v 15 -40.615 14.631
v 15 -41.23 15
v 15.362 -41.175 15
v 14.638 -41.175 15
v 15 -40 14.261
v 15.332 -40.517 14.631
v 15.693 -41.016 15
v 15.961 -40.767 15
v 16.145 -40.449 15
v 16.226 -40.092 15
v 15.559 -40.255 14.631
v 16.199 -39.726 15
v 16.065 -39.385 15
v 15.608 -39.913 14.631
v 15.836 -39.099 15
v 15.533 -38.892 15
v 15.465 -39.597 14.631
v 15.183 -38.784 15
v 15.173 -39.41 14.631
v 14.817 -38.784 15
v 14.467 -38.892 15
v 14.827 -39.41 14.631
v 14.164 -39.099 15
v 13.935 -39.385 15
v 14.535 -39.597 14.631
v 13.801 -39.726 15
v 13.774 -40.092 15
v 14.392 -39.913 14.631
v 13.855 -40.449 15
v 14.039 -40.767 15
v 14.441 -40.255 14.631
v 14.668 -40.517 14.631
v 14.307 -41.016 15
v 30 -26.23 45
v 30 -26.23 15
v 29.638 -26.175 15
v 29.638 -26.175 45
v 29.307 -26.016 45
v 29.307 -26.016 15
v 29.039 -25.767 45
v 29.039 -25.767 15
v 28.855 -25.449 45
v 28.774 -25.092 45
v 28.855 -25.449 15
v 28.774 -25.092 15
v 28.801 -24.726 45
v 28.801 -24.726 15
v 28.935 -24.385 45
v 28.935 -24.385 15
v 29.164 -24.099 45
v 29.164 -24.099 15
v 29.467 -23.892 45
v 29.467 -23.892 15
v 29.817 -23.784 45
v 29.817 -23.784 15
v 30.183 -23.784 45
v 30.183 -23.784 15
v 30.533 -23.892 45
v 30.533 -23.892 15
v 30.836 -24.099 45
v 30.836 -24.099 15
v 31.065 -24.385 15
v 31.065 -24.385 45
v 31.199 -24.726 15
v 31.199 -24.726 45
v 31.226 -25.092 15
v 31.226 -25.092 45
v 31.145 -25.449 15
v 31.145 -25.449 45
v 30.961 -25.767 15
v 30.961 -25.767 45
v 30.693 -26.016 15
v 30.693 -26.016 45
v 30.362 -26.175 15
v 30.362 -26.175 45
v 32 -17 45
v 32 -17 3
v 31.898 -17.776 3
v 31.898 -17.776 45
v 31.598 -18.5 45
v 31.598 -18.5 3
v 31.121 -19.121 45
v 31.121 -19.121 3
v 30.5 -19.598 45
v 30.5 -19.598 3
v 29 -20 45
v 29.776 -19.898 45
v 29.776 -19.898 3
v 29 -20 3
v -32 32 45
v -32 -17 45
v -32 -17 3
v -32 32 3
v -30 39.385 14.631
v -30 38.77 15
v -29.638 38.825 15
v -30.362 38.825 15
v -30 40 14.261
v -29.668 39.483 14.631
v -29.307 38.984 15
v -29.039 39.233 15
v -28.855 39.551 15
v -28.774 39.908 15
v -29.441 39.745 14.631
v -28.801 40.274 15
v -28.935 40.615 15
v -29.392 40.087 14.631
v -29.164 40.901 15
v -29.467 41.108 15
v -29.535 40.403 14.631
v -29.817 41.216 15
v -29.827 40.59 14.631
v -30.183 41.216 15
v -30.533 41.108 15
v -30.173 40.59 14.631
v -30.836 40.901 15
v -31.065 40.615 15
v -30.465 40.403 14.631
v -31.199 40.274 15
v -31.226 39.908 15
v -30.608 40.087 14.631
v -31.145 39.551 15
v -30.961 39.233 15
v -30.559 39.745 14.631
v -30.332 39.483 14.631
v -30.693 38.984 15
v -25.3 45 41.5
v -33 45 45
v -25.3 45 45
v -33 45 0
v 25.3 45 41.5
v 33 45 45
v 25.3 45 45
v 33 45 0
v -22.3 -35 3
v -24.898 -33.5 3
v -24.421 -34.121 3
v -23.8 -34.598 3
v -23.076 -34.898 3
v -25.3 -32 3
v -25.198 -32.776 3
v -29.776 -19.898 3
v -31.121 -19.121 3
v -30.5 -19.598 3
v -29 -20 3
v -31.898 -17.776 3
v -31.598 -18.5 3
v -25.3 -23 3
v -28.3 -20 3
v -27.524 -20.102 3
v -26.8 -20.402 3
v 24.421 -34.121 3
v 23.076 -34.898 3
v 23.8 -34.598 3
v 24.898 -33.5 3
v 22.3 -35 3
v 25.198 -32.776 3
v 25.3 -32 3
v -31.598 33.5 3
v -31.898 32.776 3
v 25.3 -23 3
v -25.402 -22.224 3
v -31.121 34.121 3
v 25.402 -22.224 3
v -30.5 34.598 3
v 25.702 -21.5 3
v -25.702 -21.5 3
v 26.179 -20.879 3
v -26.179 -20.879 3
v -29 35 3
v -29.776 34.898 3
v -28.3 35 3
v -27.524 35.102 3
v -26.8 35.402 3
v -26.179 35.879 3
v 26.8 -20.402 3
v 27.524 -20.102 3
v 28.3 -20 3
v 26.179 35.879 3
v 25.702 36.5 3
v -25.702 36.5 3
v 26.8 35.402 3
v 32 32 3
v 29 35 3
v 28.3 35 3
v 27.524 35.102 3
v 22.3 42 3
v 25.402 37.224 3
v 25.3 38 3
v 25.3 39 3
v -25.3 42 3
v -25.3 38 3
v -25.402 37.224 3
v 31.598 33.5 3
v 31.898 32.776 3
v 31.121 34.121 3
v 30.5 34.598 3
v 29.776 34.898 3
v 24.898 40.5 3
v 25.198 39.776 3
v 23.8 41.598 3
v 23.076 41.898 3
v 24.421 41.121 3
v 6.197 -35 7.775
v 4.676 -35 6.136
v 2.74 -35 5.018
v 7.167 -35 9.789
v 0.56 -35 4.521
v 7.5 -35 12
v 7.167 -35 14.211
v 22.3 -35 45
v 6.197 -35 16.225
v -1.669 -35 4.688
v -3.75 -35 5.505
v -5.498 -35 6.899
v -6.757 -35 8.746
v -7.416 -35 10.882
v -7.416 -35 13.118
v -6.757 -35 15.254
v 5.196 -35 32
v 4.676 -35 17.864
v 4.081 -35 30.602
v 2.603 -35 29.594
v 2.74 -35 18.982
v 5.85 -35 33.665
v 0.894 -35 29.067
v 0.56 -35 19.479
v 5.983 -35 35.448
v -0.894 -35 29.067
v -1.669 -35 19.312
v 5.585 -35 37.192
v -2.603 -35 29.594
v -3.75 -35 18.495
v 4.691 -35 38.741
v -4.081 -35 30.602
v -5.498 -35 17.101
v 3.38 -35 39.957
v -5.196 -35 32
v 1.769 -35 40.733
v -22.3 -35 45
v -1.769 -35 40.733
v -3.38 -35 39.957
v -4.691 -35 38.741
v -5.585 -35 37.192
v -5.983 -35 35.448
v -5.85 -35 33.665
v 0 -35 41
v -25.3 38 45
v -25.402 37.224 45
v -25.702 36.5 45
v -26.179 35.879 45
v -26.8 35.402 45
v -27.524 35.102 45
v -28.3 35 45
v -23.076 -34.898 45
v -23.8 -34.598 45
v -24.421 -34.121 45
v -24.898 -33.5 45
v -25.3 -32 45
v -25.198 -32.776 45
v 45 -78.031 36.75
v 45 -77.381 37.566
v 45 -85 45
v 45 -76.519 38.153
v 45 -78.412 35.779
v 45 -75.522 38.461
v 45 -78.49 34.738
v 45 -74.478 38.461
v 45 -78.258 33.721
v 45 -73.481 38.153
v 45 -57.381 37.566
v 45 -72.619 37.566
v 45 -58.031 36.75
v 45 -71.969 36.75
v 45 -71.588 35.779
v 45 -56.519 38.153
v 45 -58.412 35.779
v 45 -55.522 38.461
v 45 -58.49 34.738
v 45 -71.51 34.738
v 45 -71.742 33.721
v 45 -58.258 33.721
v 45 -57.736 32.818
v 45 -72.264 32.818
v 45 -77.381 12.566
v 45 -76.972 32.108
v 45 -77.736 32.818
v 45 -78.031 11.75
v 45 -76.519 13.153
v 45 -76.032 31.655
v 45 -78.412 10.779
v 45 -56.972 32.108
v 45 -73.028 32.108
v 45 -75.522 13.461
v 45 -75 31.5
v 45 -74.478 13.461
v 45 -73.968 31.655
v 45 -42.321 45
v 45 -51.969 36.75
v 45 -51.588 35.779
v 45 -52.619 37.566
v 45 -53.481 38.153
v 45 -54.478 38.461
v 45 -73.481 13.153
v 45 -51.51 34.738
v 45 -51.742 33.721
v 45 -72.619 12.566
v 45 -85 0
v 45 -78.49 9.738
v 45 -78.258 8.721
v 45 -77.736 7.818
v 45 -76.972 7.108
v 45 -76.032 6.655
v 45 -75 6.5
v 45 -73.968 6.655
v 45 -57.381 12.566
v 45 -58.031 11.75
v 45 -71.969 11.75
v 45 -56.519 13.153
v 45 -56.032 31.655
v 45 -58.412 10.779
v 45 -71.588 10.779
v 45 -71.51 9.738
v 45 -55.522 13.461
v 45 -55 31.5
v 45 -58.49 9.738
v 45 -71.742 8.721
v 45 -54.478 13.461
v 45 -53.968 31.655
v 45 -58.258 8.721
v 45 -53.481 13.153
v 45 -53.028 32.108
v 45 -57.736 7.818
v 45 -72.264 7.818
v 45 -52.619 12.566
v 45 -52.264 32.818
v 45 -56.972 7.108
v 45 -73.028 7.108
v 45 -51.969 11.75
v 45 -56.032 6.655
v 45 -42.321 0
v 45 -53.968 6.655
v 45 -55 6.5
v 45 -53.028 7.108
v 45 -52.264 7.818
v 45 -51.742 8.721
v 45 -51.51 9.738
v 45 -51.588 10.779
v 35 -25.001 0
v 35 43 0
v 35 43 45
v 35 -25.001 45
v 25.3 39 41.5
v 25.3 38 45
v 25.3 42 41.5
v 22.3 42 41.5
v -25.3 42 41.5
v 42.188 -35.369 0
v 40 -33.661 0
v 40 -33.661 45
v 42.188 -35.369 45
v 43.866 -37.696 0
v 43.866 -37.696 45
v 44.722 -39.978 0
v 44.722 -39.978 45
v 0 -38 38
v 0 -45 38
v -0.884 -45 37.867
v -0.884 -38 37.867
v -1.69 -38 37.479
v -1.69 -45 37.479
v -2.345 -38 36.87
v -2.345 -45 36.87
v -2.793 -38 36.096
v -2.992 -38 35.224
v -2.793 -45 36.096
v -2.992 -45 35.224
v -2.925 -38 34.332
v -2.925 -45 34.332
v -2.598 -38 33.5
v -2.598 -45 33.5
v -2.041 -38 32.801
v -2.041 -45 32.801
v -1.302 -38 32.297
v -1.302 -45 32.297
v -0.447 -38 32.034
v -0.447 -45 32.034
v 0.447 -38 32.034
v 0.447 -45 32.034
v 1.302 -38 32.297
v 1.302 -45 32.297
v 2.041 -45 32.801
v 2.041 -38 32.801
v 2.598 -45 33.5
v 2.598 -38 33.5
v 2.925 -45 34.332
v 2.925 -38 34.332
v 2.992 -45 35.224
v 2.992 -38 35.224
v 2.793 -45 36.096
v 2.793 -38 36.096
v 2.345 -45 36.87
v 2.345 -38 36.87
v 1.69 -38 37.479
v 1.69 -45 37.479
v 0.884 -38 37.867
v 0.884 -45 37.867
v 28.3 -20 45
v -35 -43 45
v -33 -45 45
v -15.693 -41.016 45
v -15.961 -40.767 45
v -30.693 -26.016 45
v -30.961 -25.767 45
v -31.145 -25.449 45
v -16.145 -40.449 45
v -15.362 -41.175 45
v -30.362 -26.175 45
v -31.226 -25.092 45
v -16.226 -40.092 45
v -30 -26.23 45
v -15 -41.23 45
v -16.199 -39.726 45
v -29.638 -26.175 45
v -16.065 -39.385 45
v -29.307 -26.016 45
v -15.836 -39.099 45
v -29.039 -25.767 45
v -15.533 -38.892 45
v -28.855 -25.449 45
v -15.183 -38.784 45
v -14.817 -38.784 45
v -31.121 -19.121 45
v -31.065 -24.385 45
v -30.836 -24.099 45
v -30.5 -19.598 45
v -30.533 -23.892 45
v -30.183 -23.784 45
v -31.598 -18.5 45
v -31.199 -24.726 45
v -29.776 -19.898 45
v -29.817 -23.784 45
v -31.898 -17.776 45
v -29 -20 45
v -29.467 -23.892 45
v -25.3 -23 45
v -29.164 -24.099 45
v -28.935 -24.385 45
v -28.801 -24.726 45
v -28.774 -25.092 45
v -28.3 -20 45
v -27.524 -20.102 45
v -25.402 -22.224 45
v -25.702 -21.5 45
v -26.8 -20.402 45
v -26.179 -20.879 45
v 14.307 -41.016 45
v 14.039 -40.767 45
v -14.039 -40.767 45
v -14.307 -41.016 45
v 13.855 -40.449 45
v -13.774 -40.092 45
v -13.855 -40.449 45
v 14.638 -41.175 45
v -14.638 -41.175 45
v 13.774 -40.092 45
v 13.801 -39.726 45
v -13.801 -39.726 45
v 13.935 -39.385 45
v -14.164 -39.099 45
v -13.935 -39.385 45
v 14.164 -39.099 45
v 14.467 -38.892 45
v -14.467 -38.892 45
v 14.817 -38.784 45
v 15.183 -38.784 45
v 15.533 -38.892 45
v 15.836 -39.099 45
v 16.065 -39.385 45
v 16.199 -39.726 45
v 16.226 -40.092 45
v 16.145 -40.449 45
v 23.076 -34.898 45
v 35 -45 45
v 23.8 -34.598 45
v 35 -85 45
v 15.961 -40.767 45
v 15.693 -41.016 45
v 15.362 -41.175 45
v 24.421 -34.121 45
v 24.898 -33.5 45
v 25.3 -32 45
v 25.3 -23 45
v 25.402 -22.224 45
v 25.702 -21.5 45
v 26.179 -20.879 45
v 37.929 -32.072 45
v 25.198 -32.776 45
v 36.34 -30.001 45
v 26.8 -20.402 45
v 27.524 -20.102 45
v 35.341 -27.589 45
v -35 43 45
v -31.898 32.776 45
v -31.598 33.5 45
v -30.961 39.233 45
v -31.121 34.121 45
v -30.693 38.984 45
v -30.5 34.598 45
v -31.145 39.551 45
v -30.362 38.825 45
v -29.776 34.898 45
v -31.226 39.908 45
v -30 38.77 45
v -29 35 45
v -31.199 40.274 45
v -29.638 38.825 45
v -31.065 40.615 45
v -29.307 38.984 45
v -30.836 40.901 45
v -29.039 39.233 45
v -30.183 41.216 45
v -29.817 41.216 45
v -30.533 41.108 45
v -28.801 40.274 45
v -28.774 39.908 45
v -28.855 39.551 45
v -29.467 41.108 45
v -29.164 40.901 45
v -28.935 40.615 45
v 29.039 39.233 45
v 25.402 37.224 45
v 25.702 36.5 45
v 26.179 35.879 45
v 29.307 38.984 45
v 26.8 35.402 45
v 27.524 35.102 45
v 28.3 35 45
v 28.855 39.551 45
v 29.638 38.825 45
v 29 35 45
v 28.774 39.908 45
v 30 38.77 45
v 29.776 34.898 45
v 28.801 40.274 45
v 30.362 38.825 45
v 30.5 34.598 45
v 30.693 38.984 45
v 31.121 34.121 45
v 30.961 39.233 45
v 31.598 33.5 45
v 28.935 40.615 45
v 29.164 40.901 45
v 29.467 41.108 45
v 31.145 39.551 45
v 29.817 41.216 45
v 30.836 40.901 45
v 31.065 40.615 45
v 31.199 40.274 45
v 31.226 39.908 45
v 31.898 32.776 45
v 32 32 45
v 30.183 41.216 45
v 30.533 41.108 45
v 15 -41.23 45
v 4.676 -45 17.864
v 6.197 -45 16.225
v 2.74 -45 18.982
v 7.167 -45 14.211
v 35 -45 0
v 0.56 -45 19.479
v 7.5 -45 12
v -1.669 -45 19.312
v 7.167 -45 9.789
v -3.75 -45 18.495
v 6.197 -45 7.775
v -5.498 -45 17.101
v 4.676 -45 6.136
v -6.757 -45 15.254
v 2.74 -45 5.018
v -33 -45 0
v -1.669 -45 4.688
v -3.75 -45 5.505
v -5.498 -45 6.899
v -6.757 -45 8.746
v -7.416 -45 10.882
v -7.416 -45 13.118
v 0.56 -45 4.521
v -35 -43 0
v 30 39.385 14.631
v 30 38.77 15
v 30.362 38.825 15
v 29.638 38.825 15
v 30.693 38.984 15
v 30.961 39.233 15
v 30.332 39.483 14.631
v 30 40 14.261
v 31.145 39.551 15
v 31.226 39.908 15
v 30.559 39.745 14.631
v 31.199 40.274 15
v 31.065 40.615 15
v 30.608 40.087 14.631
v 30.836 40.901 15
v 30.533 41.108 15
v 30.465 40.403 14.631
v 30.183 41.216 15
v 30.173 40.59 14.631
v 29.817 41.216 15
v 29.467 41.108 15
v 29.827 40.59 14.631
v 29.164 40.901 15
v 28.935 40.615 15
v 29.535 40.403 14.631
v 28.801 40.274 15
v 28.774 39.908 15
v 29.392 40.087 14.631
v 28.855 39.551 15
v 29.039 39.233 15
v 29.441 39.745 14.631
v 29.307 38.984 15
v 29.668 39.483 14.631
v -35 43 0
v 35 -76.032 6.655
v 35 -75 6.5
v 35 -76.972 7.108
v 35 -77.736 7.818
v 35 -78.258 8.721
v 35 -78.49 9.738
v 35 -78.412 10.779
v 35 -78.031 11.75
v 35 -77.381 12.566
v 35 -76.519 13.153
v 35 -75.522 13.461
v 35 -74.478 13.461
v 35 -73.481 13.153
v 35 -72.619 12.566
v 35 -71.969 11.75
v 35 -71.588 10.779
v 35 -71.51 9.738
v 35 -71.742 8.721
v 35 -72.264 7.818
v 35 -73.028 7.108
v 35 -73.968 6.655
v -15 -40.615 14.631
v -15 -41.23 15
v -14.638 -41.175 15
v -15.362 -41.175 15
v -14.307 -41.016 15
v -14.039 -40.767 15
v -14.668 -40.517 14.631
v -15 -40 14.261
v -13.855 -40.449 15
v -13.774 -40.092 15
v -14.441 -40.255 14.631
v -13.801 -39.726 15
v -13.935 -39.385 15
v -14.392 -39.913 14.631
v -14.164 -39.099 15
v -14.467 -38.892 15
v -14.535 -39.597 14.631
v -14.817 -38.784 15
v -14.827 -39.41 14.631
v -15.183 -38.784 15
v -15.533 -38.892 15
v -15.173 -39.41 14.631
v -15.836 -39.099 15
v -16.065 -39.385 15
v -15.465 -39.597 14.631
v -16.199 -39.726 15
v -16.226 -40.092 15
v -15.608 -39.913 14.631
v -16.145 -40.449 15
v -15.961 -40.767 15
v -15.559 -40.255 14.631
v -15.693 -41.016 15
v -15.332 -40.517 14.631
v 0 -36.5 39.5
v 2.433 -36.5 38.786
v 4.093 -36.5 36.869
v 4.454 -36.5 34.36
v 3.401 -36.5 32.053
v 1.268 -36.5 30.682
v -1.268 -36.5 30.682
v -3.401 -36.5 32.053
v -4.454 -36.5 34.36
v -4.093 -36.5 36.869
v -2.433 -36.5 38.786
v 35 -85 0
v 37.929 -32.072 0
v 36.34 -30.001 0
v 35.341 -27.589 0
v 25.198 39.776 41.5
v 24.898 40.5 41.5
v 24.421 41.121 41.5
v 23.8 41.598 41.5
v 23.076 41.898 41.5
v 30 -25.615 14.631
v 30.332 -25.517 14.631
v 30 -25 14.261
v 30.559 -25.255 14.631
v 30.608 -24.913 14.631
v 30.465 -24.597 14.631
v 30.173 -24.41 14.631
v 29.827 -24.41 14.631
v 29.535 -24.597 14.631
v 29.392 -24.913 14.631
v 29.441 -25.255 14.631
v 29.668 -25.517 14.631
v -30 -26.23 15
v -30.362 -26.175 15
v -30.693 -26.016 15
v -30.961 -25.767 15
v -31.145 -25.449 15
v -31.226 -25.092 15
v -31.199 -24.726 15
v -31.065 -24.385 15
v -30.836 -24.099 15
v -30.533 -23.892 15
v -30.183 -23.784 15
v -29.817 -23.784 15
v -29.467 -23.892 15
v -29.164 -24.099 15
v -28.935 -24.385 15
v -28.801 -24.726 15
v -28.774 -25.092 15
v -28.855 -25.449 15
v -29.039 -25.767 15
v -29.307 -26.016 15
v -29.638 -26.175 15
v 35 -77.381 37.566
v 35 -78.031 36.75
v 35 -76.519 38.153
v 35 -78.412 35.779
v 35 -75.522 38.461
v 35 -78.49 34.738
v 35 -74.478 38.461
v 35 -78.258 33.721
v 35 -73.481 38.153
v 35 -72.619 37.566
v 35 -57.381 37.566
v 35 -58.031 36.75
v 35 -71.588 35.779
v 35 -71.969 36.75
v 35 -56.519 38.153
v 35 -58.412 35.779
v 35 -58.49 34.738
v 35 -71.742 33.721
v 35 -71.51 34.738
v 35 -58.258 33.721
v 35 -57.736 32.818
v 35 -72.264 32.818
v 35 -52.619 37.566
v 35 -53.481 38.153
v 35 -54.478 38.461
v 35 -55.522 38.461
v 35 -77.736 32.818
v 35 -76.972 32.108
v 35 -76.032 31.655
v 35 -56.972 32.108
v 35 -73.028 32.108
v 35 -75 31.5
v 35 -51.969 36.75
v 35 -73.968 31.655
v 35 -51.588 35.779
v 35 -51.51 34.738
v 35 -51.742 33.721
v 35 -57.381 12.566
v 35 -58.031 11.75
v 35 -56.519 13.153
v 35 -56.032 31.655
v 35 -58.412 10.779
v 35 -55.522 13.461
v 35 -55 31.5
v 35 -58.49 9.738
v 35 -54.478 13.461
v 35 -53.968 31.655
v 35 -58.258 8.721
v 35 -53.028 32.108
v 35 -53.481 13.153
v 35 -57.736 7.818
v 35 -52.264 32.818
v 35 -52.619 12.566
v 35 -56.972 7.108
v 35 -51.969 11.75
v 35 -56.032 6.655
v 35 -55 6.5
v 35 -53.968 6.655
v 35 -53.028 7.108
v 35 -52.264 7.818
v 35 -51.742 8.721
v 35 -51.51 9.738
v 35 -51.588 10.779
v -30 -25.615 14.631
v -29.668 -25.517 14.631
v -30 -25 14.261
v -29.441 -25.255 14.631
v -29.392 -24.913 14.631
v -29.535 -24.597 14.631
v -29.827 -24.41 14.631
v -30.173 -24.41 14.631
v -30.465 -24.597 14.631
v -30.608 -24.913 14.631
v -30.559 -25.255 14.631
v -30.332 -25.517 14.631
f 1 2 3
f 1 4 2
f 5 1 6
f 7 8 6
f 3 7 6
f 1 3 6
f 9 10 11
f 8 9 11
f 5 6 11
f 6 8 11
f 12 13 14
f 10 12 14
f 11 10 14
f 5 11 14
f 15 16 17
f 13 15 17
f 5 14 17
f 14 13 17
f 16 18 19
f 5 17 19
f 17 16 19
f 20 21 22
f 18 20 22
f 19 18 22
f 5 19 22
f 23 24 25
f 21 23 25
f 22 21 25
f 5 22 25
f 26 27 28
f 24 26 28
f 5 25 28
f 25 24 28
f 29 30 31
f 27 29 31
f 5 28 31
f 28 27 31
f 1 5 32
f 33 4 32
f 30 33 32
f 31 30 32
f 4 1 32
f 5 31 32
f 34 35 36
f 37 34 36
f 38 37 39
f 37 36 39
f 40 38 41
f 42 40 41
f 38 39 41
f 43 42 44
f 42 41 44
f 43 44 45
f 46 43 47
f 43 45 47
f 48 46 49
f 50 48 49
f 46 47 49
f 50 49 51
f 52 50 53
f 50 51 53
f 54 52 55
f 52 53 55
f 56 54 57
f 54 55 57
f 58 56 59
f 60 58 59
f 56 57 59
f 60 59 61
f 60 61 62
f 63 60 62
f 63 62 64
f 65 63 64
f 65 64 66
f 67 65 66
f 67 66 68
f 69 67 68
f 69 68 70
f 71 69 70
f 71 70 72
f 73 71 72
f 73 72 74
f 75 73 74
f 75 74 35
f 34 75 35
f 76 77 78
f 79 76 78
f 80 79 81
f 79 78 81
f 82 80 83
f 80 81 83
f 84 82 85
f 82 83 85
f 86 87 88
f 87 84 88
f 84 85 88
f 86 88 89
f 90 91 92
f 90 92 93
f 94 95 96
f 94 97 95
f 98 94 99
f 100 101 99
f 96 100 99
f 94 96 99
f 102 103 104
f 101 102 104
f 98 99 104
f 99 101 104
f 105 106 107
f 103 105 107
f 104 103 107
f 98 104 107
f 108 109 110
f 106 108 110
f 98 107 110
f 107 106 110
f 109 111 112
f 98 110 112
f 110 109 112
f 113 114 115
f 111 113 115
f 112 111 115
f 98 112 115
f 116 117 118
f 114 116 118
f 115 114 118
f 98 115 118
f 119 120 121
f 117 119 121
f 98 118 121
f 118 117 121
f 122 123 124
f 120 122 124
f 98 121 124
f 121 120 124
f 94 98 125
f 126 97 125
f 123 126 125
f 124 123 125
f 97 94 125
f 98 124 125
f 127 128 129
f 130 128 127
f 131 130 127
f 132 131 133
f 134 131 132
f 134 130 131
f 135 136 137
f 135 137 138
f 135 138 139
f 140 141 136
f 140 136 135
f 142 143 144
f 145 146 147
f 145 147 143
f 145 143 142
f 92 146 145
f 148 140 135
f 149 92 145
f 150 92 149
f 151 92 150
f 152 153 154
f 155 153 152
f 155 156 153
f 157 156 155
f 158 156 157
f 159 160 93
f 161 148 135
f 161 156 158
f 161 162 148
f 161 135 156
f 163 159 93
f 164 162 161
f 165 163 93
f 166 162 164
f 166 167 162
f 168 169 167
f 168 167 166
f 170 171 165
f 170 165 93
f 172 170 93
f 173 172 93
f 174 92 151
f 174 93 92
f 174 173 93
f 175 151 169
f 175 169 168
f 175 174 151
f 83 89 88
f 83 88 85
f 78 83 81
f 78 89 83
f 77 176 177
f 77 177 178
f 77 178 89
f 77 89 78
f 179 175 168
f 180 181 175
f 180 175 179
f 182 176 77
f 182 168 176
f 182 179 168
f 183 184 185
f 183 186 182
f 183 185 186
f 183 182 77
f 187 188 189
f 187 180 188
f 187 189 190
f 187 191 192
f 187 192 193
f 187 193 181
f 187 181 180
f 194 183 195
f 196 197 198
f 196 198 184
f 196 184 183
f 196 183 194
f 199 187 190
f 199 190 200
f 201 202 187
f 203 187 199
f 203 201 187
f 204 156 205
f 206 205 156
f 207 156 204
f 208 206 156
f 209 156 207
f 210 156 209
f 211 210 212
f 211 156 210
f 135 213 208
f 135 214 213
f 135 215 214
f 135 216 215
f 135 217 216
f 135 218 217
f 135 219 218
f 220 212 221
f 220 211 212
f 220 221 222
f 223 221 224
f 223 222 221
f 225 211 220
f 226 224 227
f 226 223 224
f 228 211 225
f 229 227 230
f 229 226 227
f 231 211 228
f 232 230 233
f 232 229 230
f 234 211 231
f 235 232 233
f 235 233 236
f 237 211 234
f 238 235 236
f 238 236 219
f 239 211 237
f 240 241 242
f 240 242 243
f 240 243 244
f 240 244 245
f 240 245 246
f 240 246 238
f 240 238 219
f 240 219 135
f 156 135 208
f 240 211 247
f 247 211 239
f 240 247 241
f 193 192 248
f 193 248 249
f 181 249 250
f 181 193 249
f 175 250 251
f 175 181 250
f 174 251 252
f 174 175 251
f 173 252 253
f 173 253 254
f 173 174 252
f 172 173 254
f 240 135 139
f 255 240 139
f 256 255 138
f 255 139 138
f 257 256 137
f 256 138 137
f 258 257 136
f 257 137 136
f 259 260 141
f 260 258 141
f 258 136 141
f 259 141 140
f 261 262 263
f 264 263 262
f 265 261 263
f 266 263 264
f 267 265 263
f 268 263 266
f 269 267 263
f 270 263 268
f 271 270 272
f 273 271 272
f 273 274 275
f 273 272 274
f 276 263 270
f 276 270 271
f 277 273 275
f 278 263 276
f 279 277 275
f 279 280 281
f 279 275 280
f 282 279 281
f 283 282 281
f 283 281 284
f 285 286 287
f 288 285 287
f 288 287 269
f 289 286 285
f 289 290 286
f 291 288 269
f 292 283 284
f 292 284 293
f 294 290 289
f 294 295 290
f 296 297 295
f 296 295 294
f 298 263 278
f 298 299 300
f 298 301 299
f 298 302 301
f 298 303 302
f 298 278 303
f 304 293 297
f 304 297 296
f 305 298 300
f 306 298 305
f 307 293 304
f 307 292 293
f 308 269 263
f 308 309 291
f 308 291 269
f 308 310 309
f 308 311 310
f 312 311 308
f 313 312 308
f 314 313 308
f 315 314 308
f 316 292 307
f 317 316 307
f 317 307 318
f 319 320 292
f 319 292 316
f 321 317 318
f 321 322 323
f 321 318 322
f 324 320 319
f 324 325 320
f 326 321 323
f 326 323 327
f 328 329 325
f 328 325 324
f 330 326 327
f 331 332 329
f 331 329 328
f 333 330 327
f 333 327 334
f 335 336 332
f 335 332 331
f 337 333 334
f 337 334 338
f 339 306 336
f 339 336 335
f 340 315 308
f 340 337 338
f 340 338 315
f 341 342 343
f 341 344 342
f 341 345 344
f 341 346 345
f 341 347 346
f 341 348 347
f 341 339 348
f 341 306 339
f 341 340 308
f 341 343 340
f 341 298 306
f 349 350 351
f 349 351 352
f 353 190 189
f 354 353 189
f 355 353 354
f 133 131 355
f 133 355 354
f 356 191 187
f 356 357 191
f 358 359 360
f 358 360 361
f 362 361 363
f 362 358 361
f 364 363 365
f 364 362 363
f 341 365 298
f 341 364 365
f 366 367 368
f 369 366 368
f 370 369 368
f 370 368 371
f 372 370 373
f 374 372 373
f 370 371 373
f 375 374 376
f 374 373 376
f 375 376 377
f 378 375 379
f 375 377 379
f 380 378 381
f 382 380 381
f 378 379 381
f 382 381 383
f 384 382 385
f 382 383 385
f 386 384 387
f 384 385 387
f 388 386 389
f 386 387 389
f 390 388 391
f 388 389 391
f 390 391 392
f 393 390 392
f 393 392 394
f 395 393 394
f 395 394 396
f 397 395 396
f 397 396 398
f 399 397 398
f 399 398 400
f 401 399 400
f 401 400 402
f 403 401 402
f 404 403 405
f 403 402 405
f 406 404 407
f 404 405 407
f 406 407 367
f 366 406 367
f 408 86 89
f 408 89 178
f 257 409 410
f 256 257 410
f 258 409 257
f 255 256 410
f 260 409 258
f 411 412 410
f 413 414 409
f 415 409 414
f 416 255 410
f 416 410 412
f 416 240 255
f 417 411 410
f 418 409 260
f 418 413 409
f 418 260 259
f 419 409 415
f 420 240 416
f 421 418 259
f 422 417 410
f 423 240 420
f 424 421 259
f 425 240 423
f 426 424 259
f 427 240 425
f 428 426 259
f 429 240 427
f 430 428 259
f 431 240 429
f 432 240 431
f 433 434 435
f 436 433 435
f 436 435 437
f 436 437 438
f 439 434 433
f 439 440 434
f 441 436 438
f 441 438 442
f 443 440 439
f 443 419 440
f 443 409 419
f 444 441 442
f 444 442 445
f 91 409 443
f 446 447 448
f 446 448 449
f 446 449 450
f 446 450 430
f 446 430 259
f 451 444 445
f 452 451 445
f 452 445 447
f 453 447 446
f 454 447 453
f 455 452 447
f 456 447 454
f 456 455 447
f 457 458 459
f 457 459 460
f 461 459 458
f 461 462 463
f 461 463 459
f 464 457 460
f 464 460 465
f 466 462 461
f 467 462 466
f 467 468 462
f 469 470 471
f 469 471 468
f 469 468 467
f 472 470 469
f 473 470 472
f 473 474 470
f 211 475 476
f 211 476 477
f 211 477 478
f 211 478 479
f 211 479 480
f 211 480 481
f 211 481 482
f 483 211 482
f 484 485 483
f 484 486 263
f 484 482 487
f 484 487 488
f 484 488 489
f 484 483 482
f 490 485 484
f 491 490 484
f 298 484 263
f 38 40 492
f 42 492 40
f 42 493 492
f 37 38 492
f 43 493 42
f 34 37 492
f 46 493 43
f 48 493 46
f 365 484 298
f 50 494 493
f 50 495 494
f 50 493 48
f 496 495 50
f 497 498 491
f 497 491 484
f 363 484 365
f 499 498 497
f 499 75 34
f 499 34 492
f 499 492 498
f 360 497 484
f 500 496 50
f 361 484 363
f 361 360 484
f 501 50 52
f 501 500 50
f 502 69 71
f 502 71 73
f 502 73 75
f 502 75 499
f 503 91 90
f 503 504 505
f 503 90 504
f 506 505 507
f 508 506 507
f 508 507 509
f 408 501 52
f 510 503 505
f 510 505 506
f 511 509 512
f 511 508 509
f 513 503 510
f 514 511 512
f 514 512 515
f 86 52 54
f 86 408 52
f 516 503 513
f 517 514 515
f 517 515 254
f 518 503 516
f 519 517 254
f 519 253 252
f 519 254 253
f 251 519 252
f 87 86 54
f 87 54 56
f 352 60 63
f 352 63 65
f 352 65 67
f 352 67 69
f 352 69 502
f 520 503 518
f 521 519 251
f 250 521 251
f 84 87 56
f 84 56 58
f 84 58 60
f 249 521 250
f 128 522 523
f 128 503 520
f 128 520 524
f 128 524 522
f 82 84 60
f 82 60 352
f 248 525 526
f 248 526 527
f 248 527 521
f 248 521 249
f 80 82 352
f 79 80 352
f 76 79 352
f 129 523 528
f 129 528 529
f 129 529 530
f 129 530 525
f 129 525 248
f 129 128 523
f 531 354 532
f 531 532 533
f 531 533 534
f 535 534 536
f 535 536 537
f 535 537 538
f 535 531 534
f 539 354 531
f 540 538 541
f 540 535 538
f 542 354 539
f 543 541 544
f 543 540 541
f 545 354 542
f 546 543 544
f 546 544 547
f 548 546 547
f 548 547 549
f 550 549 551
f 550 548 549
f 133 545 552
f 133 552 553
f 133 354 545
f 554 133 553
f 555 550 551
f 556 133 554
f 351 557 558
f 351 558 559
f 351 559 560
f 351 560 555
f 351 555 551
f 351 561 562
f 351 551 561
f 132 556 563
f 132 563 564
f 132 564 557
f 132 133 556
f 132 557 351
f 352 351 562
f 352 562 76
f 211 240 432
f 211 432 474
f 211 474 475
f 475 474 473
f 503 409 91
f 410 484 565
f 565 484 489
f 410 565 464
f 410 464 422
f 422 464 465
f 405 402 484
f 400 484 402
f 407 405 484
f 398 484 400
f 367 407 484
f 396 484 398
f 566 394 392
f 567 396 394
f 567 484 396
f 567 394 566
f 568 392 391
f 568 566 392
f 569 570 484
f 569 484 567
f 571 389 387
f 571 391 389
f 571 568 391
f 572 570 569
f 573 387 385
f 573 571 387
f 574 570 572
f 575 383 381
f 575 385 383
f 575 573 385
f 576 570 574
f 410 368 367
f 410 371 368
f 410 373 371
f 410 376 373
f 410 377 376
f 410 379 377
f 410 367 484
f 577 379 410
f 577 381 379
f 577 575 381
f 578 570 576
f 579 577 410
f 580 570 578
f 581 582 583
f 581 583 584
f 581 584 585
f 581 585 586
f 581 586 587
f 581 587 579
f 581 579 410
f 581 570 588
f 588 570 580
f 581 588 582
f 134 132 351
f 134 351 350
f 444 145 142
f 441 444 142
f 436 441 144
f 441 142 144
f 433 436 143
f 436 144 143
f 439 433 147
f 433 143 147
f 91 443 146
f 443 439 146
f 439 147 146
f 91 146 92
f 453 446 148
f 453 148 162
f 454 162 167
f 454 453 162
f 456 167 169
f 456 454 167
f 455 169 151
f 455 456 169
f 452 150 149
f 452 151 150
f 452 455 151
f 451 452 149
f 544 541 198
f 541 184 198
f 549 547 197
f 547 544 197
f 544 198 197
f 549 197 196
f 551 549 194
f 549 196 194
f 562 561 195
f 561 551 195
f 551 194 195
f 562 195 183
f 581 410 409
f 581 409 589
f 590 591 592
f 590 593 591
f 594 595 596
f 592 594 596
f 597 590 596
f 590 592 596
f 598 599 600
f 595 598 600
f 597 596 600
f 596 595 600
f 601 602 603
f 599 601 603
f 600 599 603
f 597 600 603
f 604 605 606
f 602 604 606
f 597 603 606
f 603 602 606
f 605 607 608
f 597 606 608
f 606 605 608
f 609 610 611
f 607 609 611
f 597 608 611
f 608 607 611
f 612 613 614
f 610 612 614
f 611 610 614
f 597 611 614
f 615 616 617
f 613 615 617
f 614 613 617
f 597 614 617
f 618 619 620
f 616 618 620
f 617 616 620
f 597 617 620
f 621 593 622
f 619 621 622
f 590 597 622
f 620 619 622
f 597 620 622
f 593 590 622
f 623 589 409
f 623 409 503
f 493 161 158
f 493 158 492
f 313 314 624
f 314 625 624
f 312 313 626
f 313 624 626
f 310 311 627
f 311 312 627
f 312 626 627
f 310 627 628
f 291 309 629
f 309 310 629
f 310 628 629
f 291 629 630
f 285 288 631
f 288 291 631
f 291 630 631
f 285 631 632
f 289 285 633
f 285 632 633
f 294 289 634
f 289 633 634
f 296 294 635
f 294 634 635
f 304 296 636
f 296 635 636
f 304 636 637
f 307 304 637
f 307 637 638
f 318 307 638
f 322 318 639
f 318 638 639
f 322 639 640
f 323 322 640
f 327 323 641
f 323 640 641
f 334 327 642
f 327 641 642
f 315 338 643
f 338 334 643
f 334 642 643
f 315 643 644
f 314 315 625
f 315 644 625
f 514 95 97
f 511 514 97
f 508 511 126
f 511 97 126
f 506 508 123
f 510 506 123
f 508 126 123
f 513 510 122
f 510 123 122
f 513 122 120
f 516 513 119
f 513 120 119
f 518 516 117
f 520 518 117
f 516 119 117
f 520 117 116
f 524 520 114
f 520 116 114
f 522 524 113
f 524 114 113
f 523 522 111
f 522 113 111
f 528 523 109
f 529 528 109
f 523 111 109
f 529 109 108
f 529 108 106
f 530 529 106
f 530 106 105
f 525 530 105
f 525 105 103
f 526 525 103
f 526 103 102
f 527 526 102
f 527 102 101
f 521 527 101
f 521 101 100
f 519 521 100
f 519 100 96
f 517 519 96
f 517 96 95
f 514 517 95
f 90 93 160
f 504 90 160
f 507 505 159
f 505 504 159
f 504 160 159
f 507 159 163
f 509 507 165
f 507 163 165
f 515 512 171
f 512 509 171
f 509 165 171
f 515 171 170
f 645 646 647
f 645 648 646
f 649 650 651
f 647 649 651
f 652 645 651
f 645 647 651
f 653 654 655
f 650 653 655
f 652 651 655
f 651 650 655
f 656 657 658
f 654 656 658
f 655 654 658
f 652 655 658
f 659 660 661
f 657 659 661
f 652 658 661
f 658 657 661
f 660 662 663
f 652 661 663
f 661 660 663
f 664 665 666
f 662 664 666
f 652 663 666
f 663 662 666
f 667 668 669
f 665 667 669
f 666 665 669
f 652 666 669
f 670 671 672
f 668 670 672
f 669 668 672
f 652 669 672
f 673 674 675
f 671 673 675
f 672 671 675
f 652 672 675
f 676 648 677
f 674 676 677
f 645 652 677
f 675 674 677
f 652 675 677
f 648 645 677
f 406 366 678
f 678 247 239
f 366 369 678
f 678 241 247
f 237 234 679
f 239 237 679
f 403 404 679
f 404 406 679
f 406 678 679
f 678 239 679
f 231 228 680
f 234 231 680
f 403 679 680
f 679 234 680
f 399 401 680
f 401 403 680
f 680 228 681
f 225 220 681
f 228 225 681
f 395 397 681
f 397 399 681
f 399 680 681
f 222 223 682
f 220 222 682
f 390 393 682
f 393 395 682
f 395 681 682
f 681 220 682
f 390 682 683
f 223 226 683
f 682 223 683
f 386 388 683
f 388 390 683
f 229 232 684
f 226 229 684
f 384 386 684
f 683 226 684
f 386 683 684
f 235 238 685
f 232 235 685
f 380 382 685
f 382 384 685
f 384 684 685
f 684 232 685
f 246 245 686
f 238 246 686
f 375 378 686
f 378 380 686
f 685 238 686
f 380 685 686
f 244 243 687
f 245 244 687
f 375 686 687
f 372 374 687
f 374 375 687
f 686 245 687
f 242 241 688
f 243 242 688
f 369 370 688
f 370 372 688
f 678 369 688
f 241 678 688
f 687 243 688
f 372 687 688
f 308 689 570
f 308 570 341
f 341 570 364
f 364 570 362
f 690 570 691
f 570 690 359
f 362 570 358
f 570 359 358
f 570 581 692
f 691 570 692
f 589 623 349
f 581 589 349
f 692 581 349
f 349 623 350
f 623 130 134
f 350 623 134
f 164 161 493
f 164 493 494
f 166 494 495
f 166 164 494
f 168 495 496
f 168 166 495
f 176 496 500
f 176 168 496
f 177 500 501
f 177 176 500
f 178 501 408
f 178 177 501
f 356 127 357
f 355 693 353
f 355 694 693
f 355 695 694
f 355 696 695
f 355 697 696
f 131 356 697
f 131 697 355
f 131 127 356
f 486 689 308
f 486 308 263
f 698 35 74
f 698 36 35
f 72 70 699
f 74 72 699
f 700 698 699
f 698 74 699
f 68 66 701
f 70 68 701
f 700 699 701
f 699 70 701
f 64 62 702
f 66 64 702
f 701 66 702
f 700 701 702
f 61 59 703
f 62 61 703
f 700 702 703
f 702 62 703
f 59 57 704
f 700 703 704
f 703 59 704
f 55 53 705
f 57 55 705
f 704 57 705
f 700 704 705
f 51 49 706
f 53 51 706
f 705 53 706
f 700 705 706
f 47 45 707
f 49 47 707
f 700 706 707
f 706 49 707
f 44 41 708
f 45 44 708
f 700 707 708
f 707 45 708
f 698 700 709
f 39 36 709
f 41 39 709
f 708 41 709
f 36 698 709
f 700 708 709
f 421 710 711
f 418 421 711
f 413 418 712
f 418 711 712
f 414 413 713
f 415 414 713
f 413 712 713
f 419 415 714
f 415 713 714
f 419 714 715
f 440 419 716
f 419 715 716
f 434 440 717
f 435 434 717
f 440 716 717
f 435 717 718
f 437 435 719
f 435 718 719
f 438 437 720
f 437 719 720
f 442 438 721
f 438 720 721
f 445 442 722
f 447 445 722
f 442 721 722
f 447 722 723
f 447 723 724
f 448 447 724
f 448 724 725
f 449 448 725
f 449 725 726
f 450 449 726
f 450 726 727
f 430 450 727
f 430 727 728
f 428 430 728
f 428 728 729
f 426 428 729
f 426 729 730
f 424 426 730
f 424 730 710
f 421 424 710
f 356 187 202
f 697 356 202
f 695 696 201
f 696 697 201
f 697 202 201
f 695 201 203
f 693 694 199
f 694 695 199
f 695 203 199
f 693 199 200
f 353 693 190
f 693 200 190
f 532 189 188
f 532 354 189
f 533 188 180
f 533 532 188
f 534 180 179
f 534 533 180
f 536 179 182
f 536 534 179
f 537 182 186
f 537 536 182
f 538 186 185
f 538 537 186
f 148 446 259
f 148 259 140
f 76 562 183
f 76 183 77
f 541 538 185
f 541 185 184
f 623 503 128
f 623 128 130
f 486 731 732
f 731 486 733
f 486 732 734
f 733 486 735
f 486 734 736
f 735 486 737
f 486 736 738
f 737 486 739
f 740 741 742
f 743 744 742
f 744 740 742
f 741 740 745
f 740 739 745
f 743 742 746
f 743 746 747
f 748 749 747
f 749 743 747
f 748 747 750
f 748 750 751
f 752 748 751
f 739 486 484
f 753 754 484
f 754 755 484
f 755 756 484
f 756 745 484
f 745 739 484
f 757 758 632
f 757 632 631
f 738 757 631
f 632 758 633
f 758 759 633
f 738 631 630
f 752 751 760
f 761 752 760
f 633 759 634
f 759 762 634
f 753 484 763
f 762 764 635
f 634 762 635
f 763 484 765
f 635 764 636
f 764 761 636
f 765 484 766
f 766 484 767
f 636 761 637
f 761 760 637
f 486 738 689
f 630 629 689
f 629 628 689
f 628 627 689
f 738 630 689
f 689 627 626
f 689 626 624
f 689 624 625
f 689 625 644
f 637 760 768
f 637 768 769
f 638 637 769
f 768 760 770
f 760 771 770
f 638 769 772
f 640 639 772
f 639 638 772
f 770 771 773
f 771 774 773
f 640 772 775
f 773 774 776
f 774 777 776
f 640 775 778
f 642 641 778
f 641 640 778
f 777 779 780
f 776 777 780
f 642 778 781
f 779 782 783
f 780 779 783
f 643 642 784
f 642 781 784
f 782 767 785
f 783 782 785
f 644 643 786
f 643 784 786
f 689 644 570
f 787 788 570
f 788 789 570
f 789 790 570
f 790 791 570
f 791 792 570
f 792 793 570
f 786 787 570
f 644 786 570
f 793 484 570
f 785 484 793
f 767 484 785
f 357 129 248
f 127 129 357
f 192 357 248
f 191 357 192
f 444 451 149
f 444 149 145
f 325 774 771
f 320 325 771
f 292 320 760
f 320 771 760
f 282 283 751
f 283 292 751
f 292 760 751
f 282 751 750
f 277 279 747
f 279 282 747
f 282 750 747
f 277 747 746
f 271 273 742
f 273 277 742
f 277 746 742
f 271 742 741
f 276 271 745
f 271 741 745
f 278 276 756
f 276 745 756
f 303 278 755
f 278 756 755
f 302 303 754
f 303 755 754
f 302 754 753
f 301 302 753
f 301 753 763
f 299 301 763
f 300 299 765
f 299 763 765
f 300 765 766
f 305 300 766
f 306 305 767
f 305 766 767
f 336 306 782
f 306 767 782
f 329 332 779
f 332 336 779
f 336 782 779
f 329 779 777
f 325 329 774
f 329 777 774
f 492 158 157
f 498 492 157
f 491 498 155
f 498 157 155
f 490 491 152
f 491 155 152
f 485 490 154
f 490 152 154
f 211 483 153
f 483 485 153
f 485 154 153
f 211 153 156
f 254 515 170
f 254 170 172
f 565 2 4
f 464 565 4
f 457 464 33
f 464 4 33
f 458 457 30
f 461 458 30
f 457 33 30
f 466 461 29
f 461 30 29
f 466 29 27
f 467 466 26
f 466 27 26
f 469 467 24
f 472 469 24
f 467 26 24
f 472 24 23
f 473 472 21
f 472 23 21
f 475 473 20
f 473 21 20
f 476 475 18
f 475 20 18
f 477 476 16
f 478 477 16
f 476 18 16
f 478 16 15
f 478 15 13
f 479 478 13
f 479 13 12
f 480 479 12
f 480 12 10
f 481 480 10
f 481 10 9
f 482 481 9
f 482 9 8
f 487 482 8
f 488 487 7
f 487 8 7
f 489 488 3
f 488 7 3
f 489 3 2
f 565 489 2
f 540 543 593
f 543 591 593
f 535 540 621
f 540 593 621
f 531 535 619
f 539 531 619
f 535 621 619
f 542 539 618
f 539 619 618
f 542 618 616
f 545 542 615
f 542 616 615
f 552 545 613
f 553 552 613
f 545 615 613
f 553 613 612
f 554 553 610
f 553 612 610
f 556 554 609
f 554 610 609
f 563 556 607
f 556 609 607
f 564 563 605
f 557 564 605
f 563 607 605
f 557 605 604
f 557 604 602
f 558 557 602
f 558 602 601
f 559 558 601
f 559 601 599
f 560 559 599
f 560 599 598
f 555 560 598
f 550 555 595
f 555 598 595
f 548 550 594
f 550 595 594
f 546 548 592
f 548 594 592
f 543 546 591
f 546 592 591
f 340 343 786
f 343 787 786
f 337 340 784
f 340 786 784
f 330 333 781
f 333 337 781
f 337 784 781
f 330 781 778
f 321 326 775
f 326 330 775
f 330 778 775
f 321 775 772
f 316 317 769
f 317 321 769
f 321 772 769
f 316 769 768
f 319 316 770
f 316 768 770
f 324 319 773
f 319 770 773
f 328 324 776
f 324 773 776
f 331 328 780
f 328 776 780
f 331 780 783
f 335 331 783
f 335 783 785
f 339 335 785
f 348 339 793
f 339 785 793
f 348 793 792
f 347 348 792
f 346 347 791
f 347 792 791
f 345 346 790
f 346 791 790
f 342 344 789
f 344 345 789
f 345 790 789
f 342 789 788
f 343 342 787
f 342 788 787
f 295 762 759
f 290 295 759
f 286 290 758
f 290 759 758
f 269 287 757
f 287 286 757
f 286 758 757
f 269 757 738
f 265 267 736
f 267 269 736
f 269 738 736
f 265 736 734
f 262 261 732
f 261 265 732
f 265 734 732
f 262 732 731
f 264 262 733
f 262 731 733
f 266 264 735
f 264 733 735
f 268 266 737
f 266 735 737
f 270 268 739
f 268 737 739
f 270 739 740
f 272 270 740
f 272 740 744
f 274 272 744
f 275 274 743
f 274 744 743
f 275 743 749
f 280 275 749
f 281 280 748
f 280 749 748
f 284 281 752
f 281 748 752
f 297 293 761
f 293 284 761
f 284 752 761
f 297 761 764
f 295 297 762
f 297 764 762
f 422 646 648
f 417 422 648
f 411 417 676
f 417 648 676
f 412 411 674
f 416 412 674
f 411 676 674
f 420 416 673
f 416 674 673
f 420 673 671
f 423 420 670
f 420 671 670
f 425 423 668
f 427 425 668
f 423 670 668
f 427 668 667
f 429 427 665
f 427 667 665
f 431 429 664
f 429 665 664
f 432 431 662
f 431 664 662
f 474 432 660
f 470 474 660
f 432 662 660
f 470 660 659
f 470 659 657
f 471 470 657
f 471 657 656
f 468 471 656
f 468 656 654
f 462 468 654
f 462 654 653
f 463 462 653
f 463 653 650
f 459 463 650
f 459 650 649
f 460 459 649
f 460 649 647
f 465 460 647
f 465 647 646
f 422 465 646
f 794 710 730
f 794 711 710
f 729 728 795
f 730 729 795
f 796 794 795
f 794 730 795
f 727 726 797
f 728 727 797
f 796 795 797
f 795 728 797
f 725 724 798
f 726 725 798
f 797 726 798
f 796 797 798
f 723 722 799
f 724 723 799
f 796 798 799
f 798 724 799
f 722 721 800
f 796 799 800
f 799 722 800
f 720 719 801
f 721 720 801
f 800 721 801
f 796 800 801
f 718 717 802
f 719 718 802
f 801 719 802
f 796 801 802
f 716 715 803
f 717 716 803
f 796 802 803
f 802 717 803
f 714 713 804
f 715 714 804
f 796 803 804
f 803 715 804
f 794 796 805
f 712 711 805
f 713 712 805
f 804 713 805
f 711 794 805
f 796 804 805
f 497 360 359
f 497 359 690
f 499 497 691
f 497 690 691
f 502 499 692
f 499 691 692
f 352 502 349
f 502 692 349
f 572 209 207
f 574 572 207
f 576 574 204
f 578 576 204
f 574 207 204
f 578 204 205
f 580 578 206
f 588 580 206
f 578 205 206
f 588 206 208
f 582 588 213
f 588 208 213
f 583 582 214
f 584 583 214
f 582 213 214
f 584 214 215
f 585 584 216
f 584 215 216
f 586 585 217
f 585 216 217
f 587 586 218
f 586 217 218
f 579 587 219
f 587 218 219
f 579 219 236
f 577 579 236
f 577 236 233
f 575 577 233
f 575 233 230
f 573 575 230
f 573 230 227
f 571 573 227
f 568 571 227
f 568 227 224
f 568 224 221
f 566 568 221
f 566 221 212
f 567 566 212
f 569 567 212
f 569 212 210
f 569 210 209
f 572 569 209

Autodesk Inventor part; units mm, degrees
ref_plane "YZ Plane" through (0, 0, 0) normal (1, 0, 0) x (0, 1, 0)
ref_plane "XZ Plane" through (0, 0, 0) normal (0, 1, 0) x (-1, 0, 0)
ref_plane "XY Plane" through (0, 0, 0) normal (0, 0, 1) x (1, 0, 0)
sketch "Sketch1" plane through (0, 0, 0) normal (0, 0, 1) x (1, 0, 0)
  line L0 (-35, 45) -> (35, 45)
  line L1 (35, 45) -> (35, -45)
  line L2 (35, -45) -> (-35, -45)
  line L3 (-35, -45) -> (-35, 45)
  point P0 (0, 0)
  point P1 (0, 45)
  point P2 (-35, 0)
  dimension "d0" = 70
  dimension "d1" = 90
extrude "Extrusion1" add sketch "Sketch1" along normal blind 45
sketch "Sketch2" plane through (0, 0, 45) normal (0, 0, 1) x (1, 0, 0)
  line L0 (-25.3, 42) -> (25.3, 42)
  line L1 (25.3, 42) -> (25.3, -35)
  line L2 (25.3, -35) -> (-25.3, -35)
  line L3 (-25.3, -35) -> (-25.3, 42)
  line L4 (-35, 45) -> (-35, -45) projected
  line L5 (35, -45) -> (35, 45) projected
  line L6 (-35, -45) -> (35, -45) projected
  line L7 (35, 45) -> (-35, 45) projected
  point P0 (0, 0)
  dimension "d4" = 9.7
  dimension "d5" = 9.7
  dimension "d6" = 10
  dimension "d7" = 3
extrude "Extrusion2" cut sketch "Sketch2" against normal blind 42 contours L0 L1 L2 L3
sketch "Sketch3" plane through (-35, 45, 0) normal (0, 1, 0) x (1, 0, 0)
  line L0 (60.3, -45) -> (9.7, -45)
  line L1 (9.7, -45) -> (9.7, -41.5)
  line L2 (9.7, -41.5) -> (60.3, -41.5)
  line L3 (60.3, -41.5) -> (60.3, -45)
  line L4 (9.7, -45) -> (9.7, -3) projected
  line L5 (60.3, -45) -> (60.3, -3) projected
  line L6 (70, -45) -> (0, -45) projected
  point P0 (35, 0)
  dimension "d10" = 3.5
extrude "Extrusion3" cut sketch "Sketch3" against normal up to surface (3 mm away)
sketch "Sketch5" plane through (0, 0, 45) normal (0, 0, 1) x (1, 0, 0)
  line L0 (-33, 45) -> (-25, 45)
  line L1 (-25, 45) -> (25, 45)
  line L2 (25, 45) -> (33, 45)
  line L3 (33, 45) -> (35, 43)
  line L4 (35, 43) -> (35, -43)
  line L5 (35, -43) -> (33, -45)
  line L6 (33, -45) -> (-33, -45)
  line L7 (-33, -45) -> (-35, -43)
  line L8 (-35, -43) -> (-35, 43)
  line L9 (-35, 43) -> (-33, 45)
  line L10 (-25, -30) -> (-25, 45)
  line L11 (25, -30) -> (-25, -30)
  line L12 (25, 45) -> (25, -30)
  circle A0 centre (-30, 40) radius 2
  circle A1 centre (30, -25) radius 2
  circle A2 centre (-15, -40) radius 2
  circle A3 centre (15, -40) radius 2
  circle A4 centre (30, 40) radius 2
  circle A5 centre (-30, -25) radius 2
  line L13 (14.15, -21.6) -> (14.15, 28.85)
  arc A6 (14.15, 28.85) -> (11.65, 31.35) centre (11.65, 28.85) ccw
  line L14 (11.65, 31.35) -> (-12.5, 31.35)
  arc A7 (-12.5, 31.35) -> (-15, 28.85) centre (-12.5, 28.85) ccw
  line L15 (-15, 28.85) -> (-15, -21.6)
  arc A8 (-15, -21.6) -> (-12.5, -24.1) centre (-12.5, -21.6) ccw
  line L16 (-12.5, -24.1) -> (11.65, -24.1)
  arc A9 (11.65, -24.1) -> (14.15, -21.6) centre (11.65, -21.6) ccw
  circle A10 centre (20.135, 3.655) radius 2
  circle A11 centre (-19.865, 3.655) radius 2
  point P0 (0, 0)
hole "Hole2" at (-30, 40, 45) at (30, 40, 45) at (30, -25, 45) at (15, -40, 45) at (-15, -40, 45) at (-30, -25, 45) direction (0, 0, -1) diameter 2.459 depth 30 tip angle 118 thread size "M3x0.5" class "6H" standard "ISO Metric profile"
sketch "Sketch6" plane through (-25.3, -35, 45) normal (0, 1, 0) x (1, 0, 0)
  line L0 (50.6, 0) -> (0, 0) projected
  line L1 (0, 0) -> (0, 42) projected
  line L2 (50.6, 0) -> (50.6, 42) projected
  point P0 (25.3, 45)
  point P1 (10, 10)
  point P2 (25.3, 10)
  point P3 (25.3, 0)
  dimension "d30" = 10
  dimension "d31" = 10
hole "Hole3" at (0, -35, 35) direction (0, -1, 0) diameter 6 end through all countersink diameter 12 countersink angle 90
sketch "Sketch8" plane through (35, -45, 0) normal (1, 0, 0) x (0, 0, -1)
  line L0 (-45, 10) -> (0, 10)
  line L1 (0, 10) -> (0, -40)
  line L2 (0, -40) -> (-45, -40)
  line L3 (-45, -40) -> (-45, 10)
  line L4 (0, 0) -> (-45, 0) projected
  line L5 (-45, 0) -> (-45, 90) projected
  line L6 (0, 0) -> (0, 90) projected
  circle A0 centre (-35, -10) radius 3.5
  circle A1 centre (-10, -10) radius 3.5
  circle A2 centre (-35, -30) radius 3.5
  circle A3 centre (-10, -30) radius 3.5
  point P0 (0, 45)
  dimension "d42" = 10
  dimension "d43" = 40
  dimension "d44" = 7
  dimension "d45" = 7
  dimension "d46" = 10
  dimension "d47" = 10
  dimension "d48" = 10
  dimension "d59" = 10
extrude "Extrusion4" add sketch "Sketch8" along normal blind 10
fillet "Fillet1" radius 10 2 edges at (35, -35, 22.5) (45, -35, 22.5)
chamfer "Chamfer2" distance 2 angle 45 3 edges at (35, 45, 22.5) (-35, 45, 22.5) (-35, -45, 22.5)
sketch "Sketch9" plane through (-25.3, -35, 45) normal (0, 1, 0) x (1, 0, 0)
  circle A0 centre (25.3, 33) radius 7.5
  line L0 (50.6, 42) -> (0, 42) projected
  point P0 (25.3, 45)
  point P1 (25.3, 42)
  dimension "d55" = 15
  dimension "d56" = 9
extrude "Extrusion5" cut sketch "Sketch9" against normal through all
sketch "Sketch10" plane through (0, 0, 45) normal (0, 0, 1) x (1, 0, 0)
  line L0 (-32, 35) -> (32, 35)
  line L1 (32, 35) -> (32, -20)
  line L2 (32, -20) -> (-32, -20)
  line L3 (-32, -20) -> (-32, 35)
  line L4 (-25.3, -35) -> (-25.3, 45) projected
  line L5 (-35, 43) -> (-35, -43) projected
  circle A0 centre (-30, 40) radius 1.2295 projected
  circle A1 centre (-30, -25) radius 1.2295 projected
  point P0 (0, 0)
  point P1 (0, 35)
  point P2 (-32, 7.5)
  dimension "d60" = 3
  dimension "d61" = 5
  dimension "d62" = 5
extrude "Extrusion6" cut sketch "Sketch10" against normal up to surface (42 mm away) contours L0 L4 L2 L3 | L0 L1 L2 L4
fillet "Fillet2" radius 3 11 edges at (-25.3, -20, 24) (-32, -20, 24) (-32, 35, 24) (-25.3, 35, 24) (25.3, 42, 22.25) (25.3, 35, 24) (32, 35, 24) (32, -20, 24) (25.3, -20, 24) (25.3, -35, 24) (-25.3, -35, 24)
equation "\"d5\" = d4"
properties part number "0008-10-051 Cutie Priza"
